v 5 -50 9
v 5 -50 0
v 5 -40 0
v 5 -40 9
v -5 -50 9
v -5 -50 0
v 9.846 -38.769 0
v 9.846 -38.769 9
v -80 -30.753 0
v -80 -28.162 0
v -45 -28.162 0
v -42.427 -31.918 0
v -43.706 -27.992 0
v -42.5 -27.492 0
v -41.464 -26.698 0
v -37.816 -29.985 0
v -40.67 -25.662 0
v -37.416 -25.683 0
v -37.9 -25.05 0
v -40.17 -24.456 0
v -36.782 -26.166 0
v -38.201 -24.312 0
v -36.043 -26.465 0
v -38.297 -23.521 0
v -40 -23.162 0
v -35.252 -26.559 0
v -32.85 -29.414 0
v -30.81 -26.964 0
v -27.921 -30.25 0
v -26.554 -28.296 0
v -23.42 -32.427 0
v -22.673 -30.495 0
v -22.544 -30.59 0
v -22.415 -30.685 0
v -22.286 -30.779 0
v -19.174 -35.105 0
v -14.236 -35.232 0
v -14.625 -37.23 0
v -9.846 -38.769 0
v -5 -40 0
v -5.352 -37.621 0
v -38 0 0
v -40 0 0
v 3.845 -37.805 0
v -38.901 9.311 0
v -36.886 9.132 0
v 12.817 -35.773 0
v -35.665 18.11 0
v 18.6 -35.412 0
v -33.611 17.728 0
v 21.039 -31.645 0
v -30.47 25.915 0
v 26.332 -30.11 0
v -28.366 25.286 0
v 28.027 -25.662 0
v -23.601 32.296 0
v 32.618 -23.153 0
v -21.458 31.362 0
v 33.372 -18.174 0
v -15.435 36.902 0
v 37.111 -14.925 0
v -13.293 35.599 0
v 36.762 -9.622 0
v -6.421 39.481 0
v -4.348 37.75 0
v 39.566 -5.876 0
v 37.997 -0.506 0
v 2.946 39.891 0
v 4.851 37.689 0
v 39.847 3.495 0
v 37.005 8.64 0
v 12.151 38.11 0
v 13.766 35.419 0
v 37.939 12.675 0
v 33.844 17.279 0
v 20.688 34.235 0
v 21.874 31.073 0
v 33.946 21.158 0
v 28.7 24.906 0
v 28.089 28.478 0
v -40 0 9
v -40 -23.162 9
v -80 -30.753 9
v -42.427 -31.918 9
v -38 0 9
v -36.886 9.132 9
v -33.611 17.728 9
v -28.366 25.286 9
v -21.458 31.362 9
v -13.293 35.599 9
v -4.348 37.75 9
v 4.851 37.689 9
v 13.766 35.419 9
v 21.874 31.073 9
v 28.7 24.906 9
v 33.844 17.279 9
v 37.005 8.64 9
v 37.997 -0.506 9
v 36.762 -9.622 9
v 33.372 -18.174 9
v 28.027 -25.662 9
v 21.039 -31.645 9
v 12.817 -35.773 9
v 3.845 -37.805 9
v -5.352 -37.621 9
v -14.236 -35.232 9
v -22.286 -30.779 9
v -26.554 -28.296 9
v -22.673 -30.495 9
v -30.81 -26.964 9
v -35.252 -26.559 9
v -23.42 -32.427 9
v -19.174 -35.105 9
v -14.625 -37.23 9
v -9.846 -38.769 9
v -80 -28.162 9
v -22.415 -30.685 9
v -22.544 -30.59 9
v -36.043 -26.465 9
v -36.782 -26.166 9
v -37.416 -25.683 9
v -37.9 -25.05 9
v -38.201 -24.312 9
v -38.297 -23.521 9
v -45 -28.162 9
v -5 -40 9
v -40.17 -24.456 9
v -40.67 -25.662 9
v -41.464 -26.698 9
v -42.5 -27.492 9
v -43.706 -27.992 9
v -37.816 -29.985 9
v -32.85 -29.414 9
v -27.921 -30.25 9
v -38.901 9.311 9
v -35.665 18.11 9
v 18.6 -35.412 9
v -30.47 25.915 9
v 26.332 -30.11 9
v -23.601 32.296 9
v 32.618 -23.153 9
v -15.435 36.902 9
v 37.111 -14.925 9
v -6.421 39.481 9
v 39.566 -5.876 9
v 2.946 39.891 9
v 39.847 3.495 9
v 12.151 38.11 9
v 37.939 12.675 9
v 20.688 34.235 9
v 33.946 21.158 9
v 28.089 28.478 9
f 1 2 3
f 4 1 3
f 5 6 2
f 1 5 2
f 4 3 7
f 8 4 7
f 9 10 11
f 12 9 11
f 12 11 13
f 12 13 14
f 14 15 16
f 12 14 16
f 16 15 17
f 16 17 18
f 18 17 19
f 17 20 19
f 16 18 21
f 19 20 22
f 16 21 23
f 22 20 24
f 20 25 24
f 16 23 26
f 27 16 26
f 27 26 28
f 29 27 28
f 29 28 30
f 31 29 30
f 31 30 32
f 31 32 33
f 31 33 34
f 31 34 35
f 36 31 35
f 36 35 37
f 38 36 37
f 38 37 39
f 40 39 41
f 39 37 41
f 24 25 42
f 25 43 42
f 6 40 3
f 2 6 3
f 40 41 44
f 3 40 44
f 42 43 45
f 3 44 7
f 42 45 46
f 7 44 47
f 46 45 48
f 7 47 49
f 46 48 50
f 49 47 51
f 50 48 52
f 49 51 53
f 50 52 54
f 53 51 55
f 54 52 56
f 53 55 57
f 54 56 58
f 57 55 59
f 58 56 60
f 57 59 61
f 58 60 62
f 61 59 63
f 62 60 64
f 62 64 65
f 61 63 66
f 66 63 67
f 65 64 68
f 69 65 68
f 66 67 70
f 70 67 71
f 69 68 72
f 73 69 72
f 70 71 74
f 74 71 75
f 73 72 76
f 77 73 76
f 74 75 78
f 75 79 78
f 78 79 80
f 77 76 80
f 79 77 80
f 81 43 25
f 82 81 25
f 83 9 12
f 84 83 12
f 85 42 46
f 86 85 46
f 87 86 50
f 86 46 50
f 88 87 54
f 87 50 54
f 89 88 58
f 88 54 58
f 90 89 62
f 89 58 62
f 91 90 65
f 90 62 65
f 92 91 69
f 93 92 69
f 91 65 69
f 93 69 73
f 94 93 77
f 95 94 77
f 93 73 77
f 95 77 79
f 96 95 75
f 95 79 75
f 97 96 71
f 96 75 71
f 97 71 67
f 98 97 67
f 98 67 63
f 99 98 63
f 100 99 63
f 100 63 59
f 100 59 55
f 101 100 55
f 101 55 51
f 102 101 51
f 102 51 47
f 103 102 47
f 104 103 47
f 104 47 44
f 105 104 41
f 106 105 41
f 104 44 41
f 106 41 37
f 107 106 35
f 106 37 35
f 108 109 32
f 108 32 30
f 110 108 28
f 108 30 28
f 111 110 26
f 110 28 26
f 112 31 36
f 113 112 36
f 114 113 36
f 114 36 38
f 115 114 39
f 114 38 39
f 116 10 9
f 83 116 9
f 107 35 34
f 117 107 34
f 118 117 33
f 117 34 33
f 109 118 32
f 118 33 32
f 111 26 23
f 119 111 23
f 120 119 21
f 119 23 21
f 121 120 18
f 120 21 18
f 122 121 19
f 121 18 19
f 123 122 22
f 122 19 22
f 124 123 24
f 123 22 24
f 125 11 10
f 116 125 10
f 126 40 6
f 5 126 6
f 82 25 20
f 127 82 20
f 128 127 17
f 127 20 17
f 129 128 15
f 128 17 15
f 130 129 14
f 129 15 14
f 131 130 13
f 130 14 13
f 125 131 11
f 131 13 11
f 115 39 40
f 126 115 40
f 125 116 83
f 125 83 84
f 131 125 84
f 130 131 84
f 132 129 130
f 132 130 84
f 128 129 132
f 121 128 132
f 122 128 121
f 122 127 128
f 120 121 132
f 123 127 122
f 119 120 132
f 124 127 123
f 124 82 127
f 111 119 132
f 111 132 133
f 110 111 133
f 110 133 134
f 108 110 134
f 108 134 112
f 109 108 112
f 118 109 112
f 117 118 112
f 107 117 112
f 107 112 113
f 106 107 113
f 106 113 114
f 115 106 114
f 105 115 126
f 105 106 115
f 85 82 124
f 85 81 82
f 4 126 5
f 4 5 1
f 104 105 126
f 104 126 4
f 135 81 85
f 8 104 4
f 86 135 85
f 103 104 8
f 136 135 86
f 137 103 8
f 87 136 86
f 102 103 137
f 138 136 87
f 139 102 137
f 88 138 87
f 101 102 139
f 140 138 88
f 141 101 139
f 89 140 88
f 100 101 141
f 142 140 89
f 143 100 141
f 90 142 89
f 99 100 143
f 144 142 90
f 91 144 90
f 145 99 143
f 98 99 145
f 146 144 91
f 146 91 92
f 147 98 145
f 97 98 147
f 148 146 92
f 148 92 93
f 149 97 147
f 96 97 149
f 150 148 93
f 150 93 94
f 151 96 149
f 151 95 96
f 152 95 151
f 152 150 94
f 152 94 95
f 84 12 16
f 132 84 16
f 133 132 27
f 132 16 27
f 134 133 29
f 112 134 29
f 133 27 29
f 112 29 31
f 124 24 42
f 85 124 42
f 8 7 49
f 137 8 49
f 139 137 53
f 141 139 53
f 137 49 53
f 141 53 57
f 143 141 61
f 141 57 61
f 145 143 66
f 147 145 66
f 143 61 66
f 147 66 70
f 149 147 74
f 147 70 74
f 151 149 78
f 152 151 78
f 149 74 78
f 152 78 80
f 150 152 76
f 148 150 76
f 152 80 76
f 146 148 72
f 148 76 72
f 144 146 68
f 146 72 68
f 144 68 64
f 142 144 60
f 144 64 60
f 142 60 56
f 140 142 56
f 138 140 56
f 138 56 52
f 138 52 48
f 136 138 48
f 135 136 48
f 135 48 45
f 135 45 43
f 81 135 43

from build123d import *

# Parameters (mm, degrees)
F1_DEPTH = 9


with BuildPart() as f1:
    # F0 (on Top) → F1 (new body)
    with BuildSketch(Plane.XY):
        with BuildLine():
            Line((-9.846154, -38.769231), (-5, -40))
            Line((-5, -40), (-5, -50))
            Line((-5, -50), (5, -50))
            Line((5, -50), (5, -40))
            Line((5, -40), (9.846154, -38.769231))
            ThreePointArc((9.846154, -38.769231), (24.557625, 31.574089), (-40, 0))
            Line((-40, 0), (-40, -23.162289))
            ThreePointArc((-40, -23.162289), (-41.464466, -26.697823), (-45, -28.162289))
            Line((-45, -28.162289), (-80, -28.162289))
            Line((-80, -28.162289), (-80, -30.753131))
            Line((-80, -30.753131), (-42.426797, -31.917549))
            ThreePointArc((-42.426797, -31.917549), (-32.849773, -29.413912), (-23.420478, -32.426551))
            ThreePointArc((-23.420478, -32.426551), (-16.932944, -36.239142), (-9.846154, -38.769231))
        make_face()
        with BuildLine():
            Line((-38.29699, -23.521098), (-38, 0))
            ThreePointArc((-38, 0), (33.844209, 17.279164), (-22.285815, -30.778929))
            ThreePointArc((-22.285815, -30.778929), (-22.479913, -30.637453), (-22.673113, -30.494753))
            ThreePointArc((-22.673113, -30.494753), (-28.646621, -27.517054), (-35.251991, -26.558634))
            ThreePointArc((-35.251991, -26.558634), (-37.415945, -25.682896), (-38.29699, -23.521098))
        make_face(mode=Mode.SUBTRACT)
    extrude(amount=F1_DEPTH)


solid = f1.part
